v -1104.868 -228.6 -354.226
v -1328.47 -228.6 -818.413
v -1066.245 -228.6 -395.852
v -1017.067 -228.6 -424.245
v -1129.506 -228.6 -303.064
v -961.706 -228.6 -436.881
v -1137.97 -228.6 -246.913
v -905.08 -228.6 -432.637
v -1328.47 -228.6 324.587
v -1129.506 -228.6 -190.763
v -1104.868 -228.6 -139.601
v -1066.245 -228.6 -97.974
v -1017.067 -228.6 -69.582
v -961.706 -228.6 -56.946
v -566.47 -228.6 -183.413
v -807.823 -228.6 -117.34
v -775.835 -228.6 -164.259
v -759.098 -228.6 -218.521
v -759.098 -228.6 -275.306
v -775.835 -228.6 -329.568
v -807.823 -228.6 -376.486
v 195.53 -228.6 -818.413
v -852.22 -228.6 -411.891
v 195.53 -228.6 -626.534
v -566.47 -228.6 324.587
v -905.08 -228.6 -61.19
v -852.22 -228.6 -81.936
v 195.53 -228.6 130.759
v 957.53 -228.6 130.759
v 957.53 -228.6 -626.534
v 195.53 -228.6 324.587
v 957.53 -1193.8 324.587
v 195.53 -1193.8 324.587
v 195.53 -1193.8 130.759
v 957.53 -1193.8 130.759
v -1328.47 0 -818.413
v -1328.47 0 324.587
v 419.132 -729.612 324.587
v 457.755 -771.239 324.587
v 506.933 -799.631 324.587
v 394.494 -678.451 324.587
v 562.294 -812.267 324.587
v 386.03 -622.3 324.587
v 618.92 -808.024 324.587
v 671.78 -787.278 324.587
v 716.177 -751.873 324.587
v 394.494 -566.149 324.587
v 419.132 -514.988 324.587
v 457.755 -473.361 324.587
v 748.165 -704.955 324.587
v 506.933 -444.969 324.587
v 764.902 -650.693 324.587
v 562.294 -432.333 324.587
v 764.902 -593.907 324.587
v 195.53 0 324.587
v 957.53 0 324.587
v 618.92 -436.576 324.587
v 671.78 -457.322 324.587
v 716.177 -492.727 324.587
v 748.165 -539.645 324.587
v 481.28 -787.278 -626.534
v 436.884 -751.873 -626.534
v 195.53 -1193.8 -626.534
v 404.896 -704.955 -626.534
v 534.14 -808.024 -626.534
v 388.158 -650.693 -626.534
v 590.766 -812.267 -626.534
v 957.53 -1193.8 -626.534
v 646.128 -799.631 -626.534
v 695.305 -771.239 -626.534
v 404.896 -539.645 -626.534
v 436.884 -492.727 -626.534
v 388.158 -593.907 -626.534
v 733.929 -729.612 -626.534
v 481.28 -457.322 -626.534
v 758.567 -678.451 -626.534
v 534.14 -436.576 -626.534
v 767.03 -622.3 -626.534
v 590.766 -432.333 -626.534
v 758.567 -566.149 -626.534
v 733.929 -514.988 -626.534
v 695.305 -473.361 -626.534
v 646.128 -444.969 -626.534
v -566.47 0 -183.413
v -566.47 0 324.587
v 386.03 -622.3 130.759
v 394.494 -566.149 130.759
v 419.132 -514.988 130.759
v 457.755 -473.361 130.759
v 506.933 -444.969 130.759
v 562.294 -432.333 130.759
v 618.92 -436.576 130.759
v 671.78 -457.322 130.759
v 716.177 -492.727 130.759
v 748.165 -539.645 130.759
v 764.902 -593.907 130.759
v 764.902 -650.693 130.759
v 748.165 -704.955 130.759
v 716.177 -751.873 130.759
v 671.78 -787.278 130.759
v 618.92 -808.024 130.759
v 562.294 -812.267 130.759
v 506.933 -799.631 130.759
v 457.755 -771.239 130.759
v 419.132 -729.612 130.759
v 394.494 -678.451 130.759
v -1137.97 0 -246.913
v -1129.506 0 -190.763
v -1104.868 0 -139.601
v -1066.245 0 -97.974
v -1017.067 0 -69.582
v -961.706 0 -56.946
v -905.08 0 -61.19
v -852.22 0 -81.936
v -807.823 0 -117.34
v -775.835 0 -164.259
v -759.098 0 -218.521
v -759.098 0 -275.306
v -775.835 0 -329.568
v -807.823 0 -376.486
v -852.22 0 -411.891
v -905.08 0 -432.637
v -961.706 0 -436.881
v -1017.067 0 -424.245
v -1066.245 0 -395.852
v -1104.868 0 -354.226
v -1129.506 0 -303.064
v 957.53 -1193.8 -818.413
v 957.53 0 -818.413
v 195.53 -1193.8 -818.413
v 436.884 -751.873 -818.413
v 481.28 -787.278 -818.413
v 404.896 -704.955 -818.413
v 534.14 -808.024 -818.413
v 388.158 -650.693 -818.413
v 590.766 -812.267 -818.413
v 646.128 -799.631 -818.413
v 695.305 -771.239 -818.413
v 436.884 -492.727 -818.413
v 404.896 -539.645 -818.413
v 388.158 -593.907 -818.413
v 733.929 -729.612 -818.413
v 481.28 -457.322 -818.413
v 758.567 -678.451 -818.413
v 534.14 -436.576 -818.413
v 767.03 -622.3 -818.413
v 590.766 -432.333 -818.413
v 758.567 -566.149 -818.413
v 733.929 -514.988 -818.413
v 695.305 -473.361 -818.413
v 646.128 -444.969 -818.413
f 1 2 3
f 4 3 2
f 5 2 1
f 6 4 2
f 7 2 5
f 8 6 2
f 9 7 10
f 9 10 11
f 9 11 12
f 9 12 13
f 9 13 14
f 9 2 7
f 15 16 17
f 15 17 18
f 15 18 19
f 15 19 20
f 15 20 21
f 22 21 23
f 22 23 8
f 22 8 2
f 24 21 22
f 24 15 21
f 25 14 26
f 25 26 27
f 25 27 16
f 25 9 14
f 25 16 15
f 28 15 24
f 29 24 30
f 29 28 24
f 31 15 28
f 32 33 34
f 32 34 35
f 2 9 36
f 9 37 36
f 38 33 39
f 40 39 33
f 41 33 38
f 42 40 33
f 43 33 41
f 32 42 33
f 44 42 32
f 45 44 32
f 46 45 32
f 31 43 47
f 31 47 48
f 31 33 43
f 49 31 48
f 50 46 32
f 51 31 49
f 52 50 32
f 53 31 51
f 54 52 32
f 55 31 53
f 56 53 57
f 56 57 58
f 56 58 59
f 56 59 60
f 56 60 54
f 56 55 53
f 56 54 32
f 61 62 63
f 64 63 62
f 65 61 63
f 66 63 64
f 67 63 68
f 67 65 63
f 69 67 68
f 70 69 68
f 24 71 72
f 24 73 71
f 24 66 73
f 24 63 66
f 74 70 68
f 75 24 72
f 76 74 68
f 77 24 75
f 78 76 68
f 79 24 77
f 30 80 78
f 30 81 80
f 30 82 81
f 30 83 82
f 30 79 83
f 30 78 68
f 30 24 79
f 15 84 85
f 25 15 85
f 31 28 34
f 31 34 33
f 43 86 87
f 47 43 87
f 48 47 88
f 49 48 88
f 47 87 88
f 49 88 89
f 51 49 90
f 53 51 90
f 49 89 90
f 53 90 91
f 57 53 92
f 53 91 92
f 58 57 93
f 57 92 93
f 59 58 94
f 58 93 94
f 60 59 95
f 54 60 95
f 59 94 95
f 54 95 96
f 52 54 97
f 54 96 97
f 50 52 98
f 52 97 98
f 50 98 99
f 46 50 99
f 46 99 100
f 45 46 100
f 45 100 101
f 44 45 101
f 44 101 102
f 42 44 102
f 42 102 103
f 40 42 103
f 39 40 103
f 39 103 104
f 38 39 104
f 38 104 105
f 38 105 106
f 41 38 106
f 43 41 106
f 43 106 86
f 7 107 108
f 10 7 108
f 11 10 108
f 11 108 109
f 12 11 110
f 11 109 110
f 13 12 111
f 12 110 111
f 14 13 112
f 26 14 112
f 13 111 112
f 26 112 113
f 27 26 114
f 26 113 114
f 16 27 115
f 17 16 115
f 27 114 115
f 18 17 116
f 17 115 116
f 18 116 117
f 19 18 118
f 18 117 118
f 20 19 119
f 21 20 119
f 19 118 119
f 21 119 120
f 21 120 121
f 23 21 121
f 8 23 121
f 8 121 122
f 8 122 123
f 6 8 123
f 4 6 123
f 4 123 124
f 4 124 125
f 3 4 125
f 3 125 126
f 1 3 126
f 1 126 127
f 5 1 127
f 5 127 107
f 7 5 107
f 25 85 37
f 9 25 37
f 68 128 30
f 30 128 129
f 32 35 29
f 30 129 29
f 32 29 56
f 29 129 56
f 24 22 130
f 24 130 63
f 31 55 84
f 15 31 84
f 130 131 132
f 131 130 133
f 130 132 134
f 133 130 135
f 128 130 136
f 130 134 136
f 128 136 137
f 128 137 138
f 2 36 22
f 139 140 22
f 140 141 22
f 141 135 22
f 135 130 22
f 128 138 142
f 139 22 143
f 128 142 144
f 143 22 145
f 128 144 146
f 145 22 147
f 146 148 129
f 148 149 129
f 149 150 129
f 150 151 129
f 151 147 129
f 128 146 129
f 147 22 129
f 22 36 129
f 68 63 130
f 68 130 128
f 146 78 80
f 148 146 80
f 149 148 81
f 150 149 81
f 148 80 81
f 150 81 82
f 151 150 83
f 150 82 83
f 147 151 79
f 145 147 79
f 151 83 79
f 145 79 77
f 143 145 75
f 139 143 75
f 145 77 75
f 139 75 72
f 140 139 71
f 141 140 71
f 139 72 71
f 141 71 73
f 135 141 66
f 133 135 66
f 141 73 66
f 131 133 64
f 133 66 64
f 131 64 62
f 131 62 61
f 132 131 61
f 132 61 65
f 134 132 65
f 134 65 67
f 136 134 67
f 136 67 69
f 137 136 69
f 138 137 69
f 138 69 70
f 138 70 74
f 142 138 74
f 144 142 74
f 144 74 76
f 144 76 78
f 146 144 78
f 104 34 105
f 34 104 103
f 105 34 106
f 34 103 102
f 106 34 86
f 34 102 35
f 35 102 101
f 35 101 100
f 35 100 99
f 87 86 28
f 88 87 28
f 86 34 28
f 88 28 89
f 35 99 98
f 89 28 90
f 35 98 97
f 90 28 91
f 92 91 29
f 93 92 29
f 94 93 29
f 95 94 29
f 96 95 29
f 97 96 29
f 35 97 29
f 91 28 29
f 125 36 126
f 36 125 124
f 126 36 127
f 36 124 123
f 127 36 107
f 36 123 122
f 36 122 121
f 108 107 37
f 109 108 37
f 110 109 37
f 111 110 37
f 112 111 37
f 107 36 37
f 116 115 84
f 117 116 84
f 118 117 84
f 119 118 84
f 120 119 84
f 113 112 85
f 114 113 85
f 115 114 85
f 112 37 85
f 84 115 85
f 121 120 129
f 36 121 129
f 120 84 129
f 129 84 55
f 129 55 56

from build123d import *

# Parameters (mm, degrees)
F1_DEPTH       = 25.4
F2_DEPTH       = 203.2
F3_W           = 762
F3_H           = 193.8281174898
F3_H_2         = 191.8793287277
F4_DEPTH       = 965.2
F7_D           = 381
F7_DEPTH       = 203.2
F7_TIP         = 114.4639479248
F7_ON_F6_D     = 381
F7_ON_F6_DEPTH = 203.2
F7_ON_F6_TIP   = 114.4639479248
F9_D           = 381
F9_DEPTH       = 381
F9_TIP         = 114.4639479248


with BuildPart() as f1:
    # F0 (on Front) → F1 (new body)
    with BuildSketch(Plane.XZ):
        Polygon((-566.4698105954, 324.5866265297), (-1328.4698105954, 324.5866265297), (-1328.4698105954, -818.4133734703), (957.5301894046, -818.4133734703), (957.5301894046, 324.5866265297), (195.5301894046, 324.5866265297), (-566.4698105954, -183.4133734703), align=None)
    extrude(amount=F1_DEPTH)

    # F2 (add): a face of the model
    f2_faces = [f1.faces().sort_by_distance(p)[0] for p in [
        (-175.3098105954, -25.4, -279.0867068036),
    ]]
    extrude(f2_faces, amount=F2_DEPTH)

    # F3 (on face) → F4 (join)
    with BuildSketch(Plane.XZ.offset(228.6)):
        with Locations((576.5301894046, 227.6725677848)):
            Rectangle(F3_W, F3_H)
        with Locations((576.5301894046, -722.4737091064)):
            Rectangle(F3_W, F3_H_2)
    extrude(amount=F4_DEPTH)

    # F7
    with Locations(Plane.XY.offset(324.5866265297)):
        with Locations((576.5301894046, -622.3)):
            Hole(F7_D / 2, depth=F7_DEPTH)
            with Locations((0, 0, -(F7_DEPTH + F7_TIP / 2))):  # 118° drill point
                Cone(0, F7_D / 2, F7_TIP, mode=Mode.SUBTRACT)

    # F7 on F6 (one way)
    with BuildSketch(Plane.XY.offset(-626.5340447426)):
        with Locations((576.5301894046, -622.3)):
            Circle(F7_ON_F6_D / 2)
    extrude(amount=-F7_ON_F6_DEPTH, mode=Mode.SUBTRACT)
    with Locations(Plane.XY.offset(-626.5340447426)):
        with Locations((576.5301894046, -622.3)):
            with Locations((0, 0, -(F7_ON_F6_DEPTH + F7_ON_F6_TIP / 2))):  # 118° drill point
                Cone(0, F7_ON_F6_D / 2, F7_ON_F6_TIP, mode=Mode.SUBTRACT)

    # F9
    with Locations(Plane.XZ.offset(228.6)):
        with Locations((-947.4698105954, -246.9133734703)):
            Hole(F9_D / 2, depth=F9_DEPTH)
            with Locations((0, 0, -(F9_DEPTH + F9_TIP / 2))):  # 118° drill point
                Cone(0, F9_D / 2, F9_TIP, mode=Mode.SUBTRACT)


solid = f1.part
